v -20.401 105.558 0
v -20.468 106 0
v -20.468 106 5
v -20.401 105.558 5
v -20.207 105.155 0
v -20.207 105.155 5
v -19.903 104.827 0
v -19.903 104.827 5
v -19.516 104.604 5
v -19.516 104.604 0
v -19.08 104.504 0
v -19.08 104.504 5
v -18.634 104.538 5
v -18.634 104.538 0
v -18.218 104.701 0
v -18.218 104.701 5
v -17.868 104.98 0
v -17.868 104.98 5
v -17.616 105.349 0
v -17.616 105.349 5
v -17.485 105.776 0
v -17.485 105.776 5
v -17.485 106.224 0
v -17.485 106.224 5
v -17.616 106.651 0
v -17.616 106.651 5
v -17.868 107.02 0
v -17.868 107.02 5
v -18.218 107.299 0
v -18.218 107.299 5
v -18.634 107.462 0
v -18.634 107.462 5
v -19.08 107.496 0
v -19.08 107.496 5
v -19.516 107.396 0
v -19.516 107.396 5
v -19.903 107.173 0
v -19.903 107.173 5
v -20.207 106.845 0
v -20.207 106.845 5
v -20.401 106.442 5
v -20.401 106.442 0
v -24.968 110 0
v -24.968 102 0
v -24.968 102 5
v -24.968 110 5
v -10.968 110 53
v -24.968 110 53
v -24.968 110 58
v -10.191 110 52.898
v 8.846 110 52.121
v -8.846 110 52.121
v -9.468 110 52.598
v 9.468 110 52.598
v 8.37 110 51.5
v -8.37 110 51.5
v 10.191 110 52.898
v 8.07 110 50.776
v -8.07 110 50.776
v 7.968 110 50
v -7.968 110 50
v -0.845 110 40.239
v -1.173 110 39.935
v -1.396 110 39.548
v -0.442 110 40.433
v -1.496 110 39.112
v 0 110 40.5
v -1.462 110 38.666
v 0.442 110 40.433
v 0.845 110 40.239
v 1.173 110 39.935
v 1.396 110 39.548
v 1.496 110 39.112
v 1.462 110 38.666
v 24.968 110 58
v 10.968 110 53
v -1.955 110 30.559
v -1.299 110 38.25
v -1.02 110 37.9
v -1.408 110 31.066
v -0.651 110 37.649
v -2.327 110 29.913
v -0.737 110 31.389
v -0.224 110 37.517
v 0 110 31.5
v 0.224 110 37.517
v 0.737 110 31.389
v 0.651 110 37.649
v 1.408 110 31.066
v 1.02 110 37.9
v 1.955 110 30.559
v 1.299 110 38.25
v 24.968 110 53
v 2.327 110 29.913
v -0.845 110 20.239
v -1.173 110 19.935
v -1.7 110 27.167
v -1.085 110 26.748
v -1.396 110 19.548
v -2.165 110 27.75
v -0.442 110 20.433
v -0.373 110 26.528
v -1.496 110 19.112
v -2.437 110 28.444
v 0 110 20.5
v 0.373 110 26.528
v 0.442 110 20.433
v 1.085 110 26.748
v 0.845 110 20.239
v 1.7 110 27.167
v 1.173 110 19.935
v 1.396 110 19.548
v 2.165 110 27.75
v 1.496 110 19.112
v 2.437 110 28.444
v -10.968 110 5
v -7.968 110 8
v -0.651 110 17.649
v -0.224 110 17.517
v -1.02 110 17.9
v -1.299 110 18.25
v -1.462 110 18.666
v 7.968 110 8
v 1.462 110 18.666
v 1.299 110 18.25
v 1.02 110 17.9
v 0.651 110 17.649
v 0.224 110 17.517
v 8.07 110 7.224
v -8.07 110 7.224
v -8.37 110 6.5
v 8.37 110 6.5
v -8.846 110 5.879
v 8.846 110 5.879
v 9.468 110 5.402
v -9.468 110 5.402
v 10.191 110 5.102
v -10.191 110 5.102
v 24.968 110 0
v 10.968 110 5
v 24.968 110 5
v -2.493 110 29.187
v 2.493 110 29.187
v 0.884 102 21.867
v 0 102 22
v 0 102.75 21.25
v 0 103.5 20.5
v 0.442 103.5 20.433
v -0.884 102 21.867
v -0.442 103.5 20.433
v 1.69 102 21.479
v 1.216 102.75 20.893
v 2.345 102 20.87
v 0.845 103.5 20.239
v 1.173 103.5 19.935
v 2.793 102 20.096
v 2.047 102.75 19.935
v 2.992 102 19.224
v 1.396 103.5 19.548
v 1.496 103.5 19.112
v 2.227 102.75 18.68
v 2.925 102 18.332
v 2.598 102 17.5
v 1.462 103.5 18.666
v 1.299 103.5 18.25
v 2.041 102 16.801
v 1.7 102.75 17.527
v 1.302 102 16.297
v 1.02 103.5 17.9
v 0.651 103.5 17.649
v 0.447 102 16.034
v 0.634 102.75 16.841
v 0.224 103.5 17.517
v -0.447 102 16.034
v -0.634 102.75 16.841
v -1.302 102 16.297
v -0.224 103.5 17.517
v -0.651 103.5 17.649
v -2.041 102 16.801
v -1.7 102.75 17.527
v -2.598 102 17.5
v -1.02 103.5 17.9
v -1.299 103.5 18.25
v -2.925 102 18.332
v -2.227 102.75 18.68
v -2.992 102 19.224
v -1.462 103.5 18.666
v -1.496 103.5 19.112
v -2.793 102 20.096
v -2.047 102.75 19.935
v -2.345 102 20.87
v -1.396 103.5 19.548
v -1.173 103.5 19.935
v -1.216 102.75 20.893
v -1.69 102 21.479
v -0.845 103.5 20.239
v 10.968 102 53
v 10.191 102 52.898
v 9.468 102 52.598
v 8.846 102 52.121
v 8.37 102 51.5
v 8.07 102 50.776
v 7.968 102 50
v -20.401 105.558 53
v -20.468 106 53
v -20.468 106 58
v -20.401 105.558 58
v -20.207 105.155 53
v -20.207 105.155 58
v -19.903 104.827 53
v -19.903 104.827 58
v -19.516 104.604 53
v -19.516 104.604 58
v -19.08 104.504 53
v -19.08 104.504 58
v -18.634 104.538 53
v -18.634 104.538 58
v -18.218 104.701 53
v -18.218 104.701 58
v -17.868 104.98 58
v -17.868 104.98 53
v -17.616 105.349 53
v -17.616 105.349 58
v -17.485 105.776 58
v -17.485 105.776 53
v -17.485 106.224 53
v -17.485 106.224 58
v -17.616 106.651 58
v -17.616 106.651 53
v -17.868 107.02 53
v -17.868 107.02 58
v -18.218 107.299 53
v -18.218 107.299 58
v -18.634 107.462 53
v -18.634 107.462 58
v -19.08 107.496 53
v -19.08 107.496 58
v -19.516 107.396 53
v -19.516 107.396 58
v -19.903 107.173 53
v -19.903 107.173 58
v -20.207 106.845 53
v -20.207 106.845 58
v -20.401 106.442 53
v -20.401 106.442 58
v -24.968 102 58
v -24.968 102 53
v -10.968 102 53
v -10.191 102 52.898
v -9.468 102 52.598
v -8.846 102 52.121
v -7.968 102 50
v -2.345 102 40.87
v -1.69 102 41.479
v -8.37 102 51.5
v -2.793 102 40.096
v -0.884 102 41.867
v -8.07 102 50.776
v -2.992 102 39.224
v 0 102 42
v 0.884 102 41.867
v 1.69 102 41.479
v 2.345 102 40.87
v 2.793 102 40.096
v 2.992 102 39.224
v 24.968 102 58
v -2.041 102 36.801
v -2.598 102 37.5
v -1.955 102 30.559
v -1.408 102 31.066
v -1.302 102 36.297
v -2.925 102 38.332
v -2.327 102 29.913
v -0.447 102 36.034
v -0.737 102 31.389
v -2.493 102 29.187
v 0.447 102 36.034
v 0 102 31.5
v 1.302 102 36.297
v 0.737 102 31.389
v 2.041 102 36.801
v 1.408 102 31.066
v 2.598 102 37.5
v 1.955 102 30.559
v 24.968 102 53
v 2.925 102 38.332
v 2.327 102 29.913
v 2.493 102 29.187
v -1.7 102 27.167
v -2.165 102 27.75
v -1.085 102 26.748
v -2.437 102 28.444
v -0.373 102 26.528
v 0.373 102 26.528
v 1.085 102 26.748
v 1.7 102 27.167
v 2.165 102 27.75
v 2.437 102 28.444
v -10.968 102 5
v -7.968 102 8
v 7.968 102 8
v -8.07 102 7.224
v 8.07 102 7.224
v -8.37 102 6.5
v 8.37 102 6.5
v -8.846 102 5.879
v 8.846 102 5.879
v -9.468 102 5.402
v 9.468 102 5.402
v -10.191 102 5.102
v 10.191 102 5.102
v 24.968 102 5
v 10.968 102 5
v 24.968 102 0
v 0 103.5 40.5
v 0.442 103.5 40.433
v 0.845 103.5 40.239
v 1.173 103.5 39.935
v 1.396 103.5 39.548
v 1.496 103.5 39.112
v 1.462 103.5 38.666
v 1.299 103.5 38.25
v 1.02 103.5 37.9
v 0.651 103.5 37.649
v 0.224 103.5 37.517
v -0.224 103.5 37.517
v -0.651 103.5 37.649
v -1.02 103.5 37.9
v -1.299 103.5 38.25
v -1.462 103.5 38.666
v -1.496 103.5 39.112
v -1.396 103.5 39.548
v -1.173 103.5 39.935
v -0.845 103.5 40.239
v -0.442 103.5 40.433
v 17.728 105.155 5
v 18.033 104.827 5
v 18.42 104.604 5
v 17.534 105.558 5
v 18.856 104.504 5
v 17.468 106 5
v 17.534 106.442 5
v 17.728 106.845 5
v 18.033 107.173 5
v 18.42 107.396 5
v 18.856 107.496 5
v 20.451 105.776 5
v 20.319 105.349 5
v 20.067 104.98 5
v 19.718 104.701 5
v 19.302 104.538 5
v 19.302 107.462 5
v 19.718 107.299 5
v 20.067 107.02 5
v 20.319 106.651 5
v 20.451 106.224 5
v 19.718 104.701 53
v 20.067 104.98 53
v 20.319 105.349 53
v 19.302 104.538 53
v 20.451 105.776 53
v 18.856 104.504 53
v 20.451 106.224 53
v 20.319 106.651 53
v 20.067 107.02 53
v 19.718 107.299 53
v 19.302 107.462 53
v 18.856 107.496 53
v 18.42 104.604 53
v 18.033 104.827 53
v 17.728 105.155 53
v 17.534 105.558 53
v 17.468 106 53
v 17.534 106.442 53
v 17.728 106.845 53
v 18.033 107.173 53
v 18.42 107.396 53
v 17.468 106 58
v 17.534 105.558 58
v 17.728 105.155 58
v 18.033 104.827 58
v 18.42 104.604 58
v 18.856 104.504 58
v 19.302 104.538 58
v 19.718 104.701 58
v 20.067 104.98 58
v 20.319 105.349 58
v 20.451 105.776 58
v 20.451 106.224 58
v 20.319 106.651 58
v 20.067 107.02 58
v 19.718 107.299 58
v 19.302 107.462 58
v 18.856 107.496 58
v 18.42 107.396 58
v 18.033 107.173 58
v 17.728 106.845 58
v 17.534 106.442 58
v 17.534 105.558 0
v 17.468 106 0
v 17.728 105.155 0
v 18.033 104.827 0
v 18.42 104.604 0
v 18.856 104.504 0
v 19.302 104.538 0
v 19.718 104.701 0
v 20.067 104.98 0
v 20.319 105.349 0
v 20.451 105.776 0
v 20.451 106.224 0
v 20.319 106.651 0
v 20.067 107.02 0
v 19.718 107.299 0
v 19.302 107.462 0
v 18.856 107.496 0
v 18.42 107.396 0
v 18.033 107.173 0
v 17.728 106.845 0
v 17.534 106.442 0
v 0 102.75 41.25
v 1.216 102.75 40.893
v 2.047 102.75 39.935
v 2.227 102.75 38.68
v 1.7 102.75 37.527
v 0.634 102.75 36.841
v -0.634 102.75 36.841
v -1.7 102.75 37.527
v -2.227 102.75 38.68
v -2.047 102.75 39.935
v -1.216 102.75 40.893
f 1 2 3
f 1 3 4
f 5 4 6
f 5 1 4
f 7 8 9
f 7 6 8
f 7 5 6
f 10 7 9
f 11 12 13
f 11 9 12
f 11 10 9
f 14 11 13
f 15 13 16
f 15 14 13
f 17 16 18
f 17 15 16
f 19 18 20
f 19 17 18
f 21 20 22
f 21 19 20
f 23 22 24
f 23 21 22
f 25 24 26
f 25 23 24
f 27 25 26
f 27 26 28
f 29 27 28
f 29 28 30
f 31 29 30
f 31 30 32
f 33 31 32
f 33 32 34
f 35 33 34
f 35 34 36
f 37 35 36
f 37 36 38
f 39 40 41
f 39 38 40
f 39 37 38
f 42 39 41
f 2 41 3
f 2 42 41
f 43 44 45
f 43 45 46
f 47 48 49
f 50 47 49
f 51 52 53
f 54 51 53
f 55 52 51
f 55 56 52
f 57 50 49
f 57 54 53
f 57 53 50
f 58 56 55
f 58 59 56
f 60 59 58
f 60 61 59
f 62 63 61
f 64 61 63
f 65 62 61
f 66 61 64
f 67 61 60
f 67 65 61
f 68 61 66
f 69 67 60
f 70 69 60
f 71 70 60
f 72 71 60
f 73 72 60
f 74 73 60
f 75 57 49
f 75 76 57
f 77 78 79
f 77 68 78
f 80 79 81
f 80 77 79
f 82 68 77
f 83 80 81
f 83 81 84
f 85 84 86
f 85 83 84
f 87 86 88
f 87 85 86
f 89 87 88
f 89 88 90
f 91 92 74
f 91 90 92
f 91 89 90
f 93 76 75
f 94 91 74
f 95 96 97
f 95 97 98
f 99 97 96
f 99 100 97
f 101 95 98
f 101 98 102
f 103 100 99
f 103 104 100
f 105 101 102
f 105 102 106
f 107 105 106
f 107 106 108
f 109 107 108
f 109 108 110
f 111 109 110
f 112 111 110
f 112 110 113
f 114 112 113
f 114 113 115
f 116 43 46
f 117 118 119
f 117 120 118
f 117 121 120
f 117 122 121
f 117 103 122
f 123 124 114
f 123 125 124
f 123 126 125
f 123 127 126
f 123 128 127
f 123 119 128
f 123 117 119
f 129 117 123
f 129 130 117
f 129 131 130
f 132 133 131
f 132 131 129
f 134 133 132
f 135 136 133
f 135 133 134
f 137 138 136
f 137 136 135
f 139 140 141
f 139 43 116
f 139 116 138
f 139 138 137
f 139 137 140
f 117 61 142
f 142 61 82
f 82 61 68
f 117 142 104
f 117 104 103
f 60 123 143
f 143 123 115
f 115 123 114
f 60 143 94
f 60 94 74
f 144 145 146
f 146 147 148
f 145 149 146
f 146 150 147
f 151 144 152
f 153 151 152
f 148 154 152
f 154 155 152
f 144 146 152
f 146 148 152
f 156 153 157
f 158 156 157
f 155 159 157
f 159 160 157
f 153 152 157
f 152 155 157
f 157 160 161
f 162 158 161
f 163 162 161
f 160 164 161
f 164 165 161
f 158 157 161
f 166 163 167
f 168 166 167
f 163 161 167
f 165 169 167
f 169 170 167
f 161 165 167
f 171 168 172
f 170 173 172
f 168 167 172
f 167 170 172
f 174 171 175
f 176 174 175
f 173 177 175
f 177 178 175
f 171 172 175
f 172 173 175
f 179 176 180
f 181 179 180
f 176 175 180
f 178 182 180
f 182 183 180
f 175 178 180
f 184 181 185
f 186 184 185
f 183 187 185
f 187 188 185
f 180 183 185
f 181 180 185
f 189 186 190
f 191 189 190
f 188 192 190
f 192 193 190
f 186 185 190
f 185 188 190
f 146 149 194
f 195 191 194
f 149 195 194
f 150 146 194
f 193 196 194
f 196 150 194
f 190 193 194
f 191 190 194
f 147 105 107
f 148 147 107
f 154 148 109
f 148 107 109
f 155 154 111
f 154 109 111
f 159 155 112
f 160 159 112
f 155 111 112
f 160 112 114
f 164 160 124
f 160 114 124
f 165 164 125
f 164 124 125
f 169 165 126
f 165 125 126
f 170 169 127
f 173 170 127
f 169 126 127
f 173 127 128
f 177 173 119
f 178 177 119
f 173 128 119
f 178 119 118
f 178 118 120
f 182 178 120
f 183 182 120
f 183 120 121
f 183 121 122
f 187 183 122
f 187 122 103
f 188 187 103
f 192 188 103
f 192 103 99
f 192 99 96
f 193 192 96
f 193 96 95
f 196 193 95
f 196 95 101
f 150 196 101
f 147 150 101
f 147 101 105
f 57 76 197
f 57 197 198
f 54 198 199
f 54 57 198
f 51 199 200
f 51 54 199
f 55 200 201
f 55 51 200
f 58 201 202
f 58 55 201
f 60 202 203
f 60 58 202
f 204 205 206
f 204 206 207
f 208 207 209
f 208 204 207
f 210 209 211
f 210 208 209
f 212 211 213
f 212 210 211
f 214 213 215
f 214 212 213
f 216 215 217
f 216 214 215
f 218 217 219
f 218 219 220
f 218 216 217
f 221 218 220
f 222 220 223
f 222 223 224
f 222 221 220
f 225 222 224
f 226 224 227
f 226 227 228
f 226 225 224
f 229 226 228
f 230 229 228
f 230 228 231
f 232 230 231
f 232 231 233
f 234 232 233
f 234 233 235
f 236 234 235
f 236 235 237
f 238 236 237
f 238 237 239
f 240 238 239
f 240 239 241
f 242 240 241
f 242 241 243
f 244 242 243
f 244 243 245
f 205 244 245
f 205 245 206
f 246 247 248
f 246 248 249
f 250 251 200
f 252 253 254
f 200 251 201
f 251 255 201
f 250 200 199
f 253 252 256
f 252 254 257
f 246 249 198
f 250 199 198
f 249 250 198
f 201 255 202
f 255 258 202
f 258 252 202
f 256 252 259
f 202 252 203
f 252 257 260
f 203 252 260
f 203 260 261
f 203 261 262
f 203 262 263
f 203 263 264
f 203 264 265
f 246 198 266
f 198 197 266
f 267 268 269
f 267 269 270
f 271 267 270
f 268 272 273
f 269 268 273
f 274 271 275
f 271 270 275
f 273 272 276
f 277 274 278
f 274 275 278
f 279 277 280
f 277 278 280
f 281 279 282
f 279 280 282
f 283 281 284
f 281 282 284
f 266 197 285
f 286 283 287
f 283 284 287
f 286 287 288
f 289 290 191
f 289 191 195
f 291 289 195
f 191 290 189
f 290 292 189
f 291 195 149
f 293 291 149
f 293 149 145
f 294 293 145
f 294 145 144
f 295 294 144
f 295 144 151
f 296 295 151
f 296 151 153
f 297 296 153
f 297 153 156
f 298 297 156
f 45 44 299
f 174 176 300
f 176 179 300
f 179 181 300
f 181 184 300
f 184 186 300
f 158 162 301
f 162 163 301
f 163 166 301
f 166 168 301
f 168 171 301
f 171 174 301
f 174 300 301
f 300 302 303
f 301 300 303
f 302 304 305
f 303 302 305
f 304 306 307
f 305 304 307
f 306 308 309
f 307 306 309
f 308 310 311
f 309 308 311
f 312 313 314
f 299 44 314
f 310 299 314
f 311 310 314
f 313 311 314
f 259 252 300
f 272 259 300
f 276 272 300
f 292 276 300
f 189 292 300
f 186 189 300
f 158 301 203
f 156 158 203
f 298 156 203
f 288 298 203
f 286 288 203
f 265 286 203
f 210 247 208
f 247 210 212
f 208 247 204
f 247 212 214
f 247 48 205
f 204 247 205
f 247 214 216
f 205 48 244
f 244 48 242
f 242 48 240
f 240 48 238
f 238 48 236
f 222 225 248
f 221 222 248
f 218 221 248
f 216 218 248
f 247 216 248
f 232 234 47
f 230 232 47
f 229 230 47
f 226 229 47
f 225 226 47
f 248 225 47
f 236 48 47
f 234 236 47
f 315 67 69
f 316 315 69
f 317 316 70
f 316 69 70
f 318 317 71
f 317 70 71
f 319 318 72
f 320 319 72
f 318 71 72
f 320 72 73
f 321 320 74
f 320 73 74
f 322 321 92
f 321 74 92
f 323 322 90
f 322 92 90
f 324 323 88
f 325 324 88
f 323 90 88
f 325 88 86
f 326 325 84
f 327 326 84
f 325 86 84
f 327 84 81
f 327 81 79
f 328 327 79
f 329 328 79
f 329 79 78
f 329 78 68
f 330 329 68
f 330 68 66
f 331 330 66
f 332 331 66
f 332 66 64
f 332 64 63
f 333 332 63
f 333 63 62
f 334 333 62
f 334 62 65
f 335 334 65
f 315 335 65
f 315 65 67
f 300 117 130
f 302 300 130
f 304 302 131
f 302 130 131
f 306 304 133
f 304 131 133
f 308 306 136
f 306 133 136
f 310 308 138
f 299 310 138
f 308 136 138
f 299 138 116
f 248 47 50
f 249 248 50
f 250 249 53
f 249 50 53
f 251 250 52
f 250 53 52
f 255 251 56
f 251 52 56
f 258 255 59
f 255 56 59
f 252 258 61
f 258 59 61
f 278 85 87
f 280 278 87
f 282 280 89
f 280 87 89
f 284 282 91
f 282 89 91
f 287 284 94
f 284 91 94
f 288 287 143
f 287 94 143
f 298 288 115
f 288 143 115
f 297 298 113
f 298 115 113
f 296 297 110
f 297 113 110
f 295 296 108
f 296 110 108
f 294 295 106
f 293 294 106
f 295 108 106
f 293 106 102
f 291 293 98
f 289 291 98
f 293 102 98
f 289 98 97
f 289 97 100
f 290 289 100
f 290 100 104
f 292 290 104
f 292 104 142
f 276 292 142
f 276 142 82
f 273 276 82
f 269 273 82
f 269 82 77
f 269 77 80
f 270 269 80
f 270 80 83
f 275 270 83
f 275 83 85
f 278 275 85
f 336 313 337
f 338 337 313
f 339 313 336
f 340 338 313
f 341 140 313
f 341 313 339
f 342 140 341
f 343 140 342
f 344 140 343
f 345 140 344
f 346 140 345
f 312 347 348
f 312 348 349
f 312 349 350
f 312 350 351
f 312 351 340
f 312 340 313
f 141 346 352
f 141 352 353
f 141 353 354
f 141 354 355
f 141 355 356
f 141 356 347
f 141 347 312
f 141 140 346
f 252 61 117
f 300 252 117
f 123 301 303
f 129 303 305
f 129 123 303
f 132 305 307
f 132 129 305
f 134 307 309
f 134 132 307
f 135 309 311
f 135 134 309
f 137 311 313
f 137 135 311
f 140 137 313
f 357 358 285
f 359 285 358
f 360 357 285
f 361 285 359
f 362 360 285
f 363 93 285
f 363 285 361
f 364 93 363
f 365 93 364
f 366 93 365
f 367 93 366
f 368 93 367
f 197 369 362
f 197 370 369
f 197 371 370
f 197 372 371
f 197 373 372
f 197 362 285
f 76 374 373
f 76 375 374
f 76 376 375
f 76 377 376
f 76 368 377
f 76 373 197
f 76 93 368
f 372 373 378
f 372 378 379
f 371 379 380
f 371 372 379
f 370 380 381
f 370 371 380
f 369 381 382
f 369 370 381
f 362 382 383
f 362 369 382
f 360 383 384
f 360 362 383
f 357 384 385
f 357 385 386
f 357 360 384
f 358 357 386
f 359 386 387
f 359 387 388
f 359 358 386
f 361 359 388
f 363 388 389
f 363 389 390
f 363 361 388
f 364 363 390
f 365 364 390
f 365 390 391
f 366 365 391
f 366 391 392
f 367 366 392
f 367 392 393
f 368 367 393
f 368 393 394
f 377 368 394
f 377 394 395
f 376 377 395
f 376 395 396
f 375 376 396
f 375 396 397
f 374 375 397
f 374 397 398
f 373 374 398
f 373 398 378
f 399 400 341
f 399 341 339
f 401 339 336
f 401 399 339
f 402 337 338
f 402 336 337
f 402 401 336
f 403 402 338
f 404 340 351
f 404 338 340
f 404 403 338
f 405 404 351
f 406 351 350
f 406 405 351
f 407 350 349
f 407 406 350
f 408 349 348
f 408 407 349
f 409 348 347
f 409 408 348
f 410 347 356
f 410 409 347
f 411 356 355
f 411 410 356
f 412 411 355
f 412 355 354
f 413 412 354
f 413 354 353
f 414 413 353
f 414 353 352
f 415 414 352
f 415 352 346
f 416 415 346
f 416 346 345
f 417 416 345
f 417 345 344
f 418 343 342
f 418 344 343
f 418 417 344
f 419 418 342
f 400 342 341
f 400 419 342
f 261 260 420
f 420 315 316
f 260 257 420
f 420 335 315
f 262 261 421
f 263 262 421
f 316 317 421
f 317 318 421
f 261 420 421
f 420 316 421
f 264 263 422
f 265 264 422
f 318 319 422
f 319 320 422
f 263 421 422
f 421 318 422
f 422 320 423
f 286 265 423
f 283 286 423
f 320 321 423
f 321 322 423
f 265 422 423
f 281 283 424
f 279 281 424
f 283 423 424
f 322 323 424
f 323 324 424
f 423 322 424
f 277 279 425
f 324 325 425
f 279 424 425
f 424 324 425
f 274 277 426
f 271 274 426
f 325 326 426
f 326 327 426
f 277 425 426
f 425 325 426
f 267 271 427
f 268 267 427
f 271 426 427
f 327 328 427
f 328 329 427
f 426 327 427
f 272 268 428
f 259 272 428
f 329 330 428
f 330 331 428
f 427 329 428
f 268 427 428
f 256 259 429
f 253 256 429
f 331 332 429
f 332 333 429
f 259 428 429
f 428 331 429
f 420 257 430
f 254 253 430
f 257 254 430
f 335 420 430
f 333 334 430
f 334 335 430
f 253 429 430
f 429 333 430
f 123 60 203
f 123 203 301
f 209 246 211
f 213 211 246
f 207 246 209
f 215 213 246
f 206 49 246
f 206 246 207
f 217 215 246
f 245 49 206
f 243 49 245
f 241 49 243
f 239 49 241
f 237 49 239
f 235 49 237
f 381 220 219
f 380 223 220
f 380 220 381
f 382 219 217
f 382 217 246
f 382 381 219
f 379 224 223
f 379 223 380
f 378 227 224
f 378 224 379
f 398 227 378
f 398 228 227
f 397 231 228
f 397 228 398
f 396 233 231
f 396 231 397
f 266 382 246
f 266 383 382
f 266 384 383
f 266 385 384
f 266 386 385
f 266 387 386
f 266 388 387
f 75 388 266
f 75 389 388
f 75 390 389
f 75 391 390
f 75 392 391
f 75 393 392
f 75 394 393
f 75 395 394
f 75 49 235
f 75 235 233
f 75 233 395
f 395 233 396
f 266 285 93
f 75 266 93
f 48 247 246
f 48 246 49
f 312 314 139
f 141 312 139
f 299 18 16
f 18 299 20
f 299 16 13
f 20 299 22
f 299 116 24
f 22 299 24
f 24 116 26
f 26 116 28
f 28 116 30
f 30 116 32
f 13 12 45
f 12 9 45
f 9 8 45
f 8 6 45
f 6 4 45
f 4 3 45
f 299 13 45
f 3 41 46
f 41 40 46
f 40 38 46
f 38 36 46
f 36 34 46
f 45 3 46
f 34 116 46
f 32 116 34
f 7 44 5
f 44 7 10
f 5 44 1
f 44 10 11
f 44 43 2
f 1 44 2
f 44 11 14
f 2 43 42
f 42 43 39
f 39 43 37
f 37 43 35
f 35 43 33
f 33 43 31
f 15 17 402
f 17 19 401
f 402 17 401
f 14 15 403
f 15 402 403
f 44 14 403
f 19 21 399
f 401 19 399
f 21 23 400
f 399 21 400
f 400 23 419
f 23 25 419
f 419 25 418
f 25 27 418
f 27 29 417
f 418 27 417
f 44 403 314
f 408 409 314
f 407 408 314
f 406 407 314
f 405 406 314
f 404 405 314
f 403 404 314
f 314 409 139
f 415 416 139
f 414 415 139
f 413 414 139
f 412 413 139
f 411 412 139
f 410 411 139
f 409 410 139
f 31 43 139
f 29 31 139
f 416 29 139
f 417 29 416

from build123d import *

# Parameters (mm, degrees)
SKETCH_1_W               = 49.93556627
SKETCH_1_H               = 8
EXTRUDE_1_DEPTH          = 58
SKETCH_2_R               = 2.5
SKETCH_2_R_2             = 1.5
CUT_EXTRUDE_1_DEPTH      = 10
CUT_EXTRUDE_2_DEPTH      = 53
CUT_EXTRUDE_2_DEPTH_BACK = 7
SKETCH_3_R               = 1.5
CHAMFER_1_SIZE           = 1.5


with BuildPart() as part:
    # 草图1 → 凸台-拉伸1 (new body)
    with BuildSketch(Plane.XY):
        with Locations((0, 106)):
            Rectangle(SKETCH_1_W, SKETCH_1_H)
    extrude(amount=EXTRUDE_1_DEPTH)

    # 草图2 → 切除-拉伸1 (cut)
    with BuildSketch(Plane(origin=(0, 110, 0), x_dir=(1, 0, 0), z_dir=(0, 1, 0))):
        with Locations(Location((0, -29, 0), (0, 0, 270))):
            Circle(SKETCH_2_R)
        with Locations(Location((0, -39, 0), (0, 0, 270))):
            Circle(SKETCH_2_R_2)
        with Locations(Location((0, -19, 0), (0, 0, 270))):
            Circle(SKETCH_2_R_2)
        with BuildLine():
            Line((24.967783135, -53), (10.967783135, -53))
            ThreePointArc((10.967783135, -53), (8.846462792, -52.121320344), (7.967783135, -50))
            Line((7.967783135, -50), (7.967783135, -8))
            ThreePointArc((7.967783135, -8), (8.846462792, -5.878679656), (10.967783135, -5))
            Line((10.967783135, -5), (24.967783135, -5))
            Line((24.967783135, -5), (24.967783135, -53))
        make_face()
        with BuildLine():
            Line((-7.967783135, -50), (-7.967783135, -8))
            ThreePointArc((-7.967783135, -8), (-8.846462792, -5.878679656), (-10.967783135, -5))
            Line((-10.967783135, -5), (-24.967783135, -5))
            Line((-24.967783135, -5), (-24.967783135, -53))
            Line((-24.967783135, -53), (-10.967783135, -53))
            ThreePointArc((-10.967783135, -53), (-8.846462792, -52.121320344), (-7.967783135, -50))
        make_face()
    extrude(amount=-CUT_EXTRUDE_1_DEPTH, mode=Mode.SUBTRACT)

    # 草图3 → 切除-拉伸2 (cut, two sides: drawn at the far end of the back side and taken through both)
    with BuildSketch(Plane.XY.offset(5).offset(-CUT_EXTRUDE_2_DEPTH_BACK)):
        with Locations(Location((18.967783135, 106, 0), (0, 0, 180))):
            Circle(SKETCH_3_R)
        with Locations(Location((-18.967783135, 106, 0), (0, 0, 180))):
            Circle(SKETCH_3_R)
    extrude(amount=CUT_EXTRUDE_2_DEPTH + CUT_EXTRUDE_2_DEPTH_BACK, mode=Mode.SUBTRACT)

    # 倒角1
    chamfer_1_edges = [part.edges().sort_by_distance(p)[0] for p in [
        (0, 102, 17.5),
        (0, 102, 37.5),
    ]]
    chamfer(chamfer_1_edges, length=CHAMFER_1_SIZE)


solid = part.part
